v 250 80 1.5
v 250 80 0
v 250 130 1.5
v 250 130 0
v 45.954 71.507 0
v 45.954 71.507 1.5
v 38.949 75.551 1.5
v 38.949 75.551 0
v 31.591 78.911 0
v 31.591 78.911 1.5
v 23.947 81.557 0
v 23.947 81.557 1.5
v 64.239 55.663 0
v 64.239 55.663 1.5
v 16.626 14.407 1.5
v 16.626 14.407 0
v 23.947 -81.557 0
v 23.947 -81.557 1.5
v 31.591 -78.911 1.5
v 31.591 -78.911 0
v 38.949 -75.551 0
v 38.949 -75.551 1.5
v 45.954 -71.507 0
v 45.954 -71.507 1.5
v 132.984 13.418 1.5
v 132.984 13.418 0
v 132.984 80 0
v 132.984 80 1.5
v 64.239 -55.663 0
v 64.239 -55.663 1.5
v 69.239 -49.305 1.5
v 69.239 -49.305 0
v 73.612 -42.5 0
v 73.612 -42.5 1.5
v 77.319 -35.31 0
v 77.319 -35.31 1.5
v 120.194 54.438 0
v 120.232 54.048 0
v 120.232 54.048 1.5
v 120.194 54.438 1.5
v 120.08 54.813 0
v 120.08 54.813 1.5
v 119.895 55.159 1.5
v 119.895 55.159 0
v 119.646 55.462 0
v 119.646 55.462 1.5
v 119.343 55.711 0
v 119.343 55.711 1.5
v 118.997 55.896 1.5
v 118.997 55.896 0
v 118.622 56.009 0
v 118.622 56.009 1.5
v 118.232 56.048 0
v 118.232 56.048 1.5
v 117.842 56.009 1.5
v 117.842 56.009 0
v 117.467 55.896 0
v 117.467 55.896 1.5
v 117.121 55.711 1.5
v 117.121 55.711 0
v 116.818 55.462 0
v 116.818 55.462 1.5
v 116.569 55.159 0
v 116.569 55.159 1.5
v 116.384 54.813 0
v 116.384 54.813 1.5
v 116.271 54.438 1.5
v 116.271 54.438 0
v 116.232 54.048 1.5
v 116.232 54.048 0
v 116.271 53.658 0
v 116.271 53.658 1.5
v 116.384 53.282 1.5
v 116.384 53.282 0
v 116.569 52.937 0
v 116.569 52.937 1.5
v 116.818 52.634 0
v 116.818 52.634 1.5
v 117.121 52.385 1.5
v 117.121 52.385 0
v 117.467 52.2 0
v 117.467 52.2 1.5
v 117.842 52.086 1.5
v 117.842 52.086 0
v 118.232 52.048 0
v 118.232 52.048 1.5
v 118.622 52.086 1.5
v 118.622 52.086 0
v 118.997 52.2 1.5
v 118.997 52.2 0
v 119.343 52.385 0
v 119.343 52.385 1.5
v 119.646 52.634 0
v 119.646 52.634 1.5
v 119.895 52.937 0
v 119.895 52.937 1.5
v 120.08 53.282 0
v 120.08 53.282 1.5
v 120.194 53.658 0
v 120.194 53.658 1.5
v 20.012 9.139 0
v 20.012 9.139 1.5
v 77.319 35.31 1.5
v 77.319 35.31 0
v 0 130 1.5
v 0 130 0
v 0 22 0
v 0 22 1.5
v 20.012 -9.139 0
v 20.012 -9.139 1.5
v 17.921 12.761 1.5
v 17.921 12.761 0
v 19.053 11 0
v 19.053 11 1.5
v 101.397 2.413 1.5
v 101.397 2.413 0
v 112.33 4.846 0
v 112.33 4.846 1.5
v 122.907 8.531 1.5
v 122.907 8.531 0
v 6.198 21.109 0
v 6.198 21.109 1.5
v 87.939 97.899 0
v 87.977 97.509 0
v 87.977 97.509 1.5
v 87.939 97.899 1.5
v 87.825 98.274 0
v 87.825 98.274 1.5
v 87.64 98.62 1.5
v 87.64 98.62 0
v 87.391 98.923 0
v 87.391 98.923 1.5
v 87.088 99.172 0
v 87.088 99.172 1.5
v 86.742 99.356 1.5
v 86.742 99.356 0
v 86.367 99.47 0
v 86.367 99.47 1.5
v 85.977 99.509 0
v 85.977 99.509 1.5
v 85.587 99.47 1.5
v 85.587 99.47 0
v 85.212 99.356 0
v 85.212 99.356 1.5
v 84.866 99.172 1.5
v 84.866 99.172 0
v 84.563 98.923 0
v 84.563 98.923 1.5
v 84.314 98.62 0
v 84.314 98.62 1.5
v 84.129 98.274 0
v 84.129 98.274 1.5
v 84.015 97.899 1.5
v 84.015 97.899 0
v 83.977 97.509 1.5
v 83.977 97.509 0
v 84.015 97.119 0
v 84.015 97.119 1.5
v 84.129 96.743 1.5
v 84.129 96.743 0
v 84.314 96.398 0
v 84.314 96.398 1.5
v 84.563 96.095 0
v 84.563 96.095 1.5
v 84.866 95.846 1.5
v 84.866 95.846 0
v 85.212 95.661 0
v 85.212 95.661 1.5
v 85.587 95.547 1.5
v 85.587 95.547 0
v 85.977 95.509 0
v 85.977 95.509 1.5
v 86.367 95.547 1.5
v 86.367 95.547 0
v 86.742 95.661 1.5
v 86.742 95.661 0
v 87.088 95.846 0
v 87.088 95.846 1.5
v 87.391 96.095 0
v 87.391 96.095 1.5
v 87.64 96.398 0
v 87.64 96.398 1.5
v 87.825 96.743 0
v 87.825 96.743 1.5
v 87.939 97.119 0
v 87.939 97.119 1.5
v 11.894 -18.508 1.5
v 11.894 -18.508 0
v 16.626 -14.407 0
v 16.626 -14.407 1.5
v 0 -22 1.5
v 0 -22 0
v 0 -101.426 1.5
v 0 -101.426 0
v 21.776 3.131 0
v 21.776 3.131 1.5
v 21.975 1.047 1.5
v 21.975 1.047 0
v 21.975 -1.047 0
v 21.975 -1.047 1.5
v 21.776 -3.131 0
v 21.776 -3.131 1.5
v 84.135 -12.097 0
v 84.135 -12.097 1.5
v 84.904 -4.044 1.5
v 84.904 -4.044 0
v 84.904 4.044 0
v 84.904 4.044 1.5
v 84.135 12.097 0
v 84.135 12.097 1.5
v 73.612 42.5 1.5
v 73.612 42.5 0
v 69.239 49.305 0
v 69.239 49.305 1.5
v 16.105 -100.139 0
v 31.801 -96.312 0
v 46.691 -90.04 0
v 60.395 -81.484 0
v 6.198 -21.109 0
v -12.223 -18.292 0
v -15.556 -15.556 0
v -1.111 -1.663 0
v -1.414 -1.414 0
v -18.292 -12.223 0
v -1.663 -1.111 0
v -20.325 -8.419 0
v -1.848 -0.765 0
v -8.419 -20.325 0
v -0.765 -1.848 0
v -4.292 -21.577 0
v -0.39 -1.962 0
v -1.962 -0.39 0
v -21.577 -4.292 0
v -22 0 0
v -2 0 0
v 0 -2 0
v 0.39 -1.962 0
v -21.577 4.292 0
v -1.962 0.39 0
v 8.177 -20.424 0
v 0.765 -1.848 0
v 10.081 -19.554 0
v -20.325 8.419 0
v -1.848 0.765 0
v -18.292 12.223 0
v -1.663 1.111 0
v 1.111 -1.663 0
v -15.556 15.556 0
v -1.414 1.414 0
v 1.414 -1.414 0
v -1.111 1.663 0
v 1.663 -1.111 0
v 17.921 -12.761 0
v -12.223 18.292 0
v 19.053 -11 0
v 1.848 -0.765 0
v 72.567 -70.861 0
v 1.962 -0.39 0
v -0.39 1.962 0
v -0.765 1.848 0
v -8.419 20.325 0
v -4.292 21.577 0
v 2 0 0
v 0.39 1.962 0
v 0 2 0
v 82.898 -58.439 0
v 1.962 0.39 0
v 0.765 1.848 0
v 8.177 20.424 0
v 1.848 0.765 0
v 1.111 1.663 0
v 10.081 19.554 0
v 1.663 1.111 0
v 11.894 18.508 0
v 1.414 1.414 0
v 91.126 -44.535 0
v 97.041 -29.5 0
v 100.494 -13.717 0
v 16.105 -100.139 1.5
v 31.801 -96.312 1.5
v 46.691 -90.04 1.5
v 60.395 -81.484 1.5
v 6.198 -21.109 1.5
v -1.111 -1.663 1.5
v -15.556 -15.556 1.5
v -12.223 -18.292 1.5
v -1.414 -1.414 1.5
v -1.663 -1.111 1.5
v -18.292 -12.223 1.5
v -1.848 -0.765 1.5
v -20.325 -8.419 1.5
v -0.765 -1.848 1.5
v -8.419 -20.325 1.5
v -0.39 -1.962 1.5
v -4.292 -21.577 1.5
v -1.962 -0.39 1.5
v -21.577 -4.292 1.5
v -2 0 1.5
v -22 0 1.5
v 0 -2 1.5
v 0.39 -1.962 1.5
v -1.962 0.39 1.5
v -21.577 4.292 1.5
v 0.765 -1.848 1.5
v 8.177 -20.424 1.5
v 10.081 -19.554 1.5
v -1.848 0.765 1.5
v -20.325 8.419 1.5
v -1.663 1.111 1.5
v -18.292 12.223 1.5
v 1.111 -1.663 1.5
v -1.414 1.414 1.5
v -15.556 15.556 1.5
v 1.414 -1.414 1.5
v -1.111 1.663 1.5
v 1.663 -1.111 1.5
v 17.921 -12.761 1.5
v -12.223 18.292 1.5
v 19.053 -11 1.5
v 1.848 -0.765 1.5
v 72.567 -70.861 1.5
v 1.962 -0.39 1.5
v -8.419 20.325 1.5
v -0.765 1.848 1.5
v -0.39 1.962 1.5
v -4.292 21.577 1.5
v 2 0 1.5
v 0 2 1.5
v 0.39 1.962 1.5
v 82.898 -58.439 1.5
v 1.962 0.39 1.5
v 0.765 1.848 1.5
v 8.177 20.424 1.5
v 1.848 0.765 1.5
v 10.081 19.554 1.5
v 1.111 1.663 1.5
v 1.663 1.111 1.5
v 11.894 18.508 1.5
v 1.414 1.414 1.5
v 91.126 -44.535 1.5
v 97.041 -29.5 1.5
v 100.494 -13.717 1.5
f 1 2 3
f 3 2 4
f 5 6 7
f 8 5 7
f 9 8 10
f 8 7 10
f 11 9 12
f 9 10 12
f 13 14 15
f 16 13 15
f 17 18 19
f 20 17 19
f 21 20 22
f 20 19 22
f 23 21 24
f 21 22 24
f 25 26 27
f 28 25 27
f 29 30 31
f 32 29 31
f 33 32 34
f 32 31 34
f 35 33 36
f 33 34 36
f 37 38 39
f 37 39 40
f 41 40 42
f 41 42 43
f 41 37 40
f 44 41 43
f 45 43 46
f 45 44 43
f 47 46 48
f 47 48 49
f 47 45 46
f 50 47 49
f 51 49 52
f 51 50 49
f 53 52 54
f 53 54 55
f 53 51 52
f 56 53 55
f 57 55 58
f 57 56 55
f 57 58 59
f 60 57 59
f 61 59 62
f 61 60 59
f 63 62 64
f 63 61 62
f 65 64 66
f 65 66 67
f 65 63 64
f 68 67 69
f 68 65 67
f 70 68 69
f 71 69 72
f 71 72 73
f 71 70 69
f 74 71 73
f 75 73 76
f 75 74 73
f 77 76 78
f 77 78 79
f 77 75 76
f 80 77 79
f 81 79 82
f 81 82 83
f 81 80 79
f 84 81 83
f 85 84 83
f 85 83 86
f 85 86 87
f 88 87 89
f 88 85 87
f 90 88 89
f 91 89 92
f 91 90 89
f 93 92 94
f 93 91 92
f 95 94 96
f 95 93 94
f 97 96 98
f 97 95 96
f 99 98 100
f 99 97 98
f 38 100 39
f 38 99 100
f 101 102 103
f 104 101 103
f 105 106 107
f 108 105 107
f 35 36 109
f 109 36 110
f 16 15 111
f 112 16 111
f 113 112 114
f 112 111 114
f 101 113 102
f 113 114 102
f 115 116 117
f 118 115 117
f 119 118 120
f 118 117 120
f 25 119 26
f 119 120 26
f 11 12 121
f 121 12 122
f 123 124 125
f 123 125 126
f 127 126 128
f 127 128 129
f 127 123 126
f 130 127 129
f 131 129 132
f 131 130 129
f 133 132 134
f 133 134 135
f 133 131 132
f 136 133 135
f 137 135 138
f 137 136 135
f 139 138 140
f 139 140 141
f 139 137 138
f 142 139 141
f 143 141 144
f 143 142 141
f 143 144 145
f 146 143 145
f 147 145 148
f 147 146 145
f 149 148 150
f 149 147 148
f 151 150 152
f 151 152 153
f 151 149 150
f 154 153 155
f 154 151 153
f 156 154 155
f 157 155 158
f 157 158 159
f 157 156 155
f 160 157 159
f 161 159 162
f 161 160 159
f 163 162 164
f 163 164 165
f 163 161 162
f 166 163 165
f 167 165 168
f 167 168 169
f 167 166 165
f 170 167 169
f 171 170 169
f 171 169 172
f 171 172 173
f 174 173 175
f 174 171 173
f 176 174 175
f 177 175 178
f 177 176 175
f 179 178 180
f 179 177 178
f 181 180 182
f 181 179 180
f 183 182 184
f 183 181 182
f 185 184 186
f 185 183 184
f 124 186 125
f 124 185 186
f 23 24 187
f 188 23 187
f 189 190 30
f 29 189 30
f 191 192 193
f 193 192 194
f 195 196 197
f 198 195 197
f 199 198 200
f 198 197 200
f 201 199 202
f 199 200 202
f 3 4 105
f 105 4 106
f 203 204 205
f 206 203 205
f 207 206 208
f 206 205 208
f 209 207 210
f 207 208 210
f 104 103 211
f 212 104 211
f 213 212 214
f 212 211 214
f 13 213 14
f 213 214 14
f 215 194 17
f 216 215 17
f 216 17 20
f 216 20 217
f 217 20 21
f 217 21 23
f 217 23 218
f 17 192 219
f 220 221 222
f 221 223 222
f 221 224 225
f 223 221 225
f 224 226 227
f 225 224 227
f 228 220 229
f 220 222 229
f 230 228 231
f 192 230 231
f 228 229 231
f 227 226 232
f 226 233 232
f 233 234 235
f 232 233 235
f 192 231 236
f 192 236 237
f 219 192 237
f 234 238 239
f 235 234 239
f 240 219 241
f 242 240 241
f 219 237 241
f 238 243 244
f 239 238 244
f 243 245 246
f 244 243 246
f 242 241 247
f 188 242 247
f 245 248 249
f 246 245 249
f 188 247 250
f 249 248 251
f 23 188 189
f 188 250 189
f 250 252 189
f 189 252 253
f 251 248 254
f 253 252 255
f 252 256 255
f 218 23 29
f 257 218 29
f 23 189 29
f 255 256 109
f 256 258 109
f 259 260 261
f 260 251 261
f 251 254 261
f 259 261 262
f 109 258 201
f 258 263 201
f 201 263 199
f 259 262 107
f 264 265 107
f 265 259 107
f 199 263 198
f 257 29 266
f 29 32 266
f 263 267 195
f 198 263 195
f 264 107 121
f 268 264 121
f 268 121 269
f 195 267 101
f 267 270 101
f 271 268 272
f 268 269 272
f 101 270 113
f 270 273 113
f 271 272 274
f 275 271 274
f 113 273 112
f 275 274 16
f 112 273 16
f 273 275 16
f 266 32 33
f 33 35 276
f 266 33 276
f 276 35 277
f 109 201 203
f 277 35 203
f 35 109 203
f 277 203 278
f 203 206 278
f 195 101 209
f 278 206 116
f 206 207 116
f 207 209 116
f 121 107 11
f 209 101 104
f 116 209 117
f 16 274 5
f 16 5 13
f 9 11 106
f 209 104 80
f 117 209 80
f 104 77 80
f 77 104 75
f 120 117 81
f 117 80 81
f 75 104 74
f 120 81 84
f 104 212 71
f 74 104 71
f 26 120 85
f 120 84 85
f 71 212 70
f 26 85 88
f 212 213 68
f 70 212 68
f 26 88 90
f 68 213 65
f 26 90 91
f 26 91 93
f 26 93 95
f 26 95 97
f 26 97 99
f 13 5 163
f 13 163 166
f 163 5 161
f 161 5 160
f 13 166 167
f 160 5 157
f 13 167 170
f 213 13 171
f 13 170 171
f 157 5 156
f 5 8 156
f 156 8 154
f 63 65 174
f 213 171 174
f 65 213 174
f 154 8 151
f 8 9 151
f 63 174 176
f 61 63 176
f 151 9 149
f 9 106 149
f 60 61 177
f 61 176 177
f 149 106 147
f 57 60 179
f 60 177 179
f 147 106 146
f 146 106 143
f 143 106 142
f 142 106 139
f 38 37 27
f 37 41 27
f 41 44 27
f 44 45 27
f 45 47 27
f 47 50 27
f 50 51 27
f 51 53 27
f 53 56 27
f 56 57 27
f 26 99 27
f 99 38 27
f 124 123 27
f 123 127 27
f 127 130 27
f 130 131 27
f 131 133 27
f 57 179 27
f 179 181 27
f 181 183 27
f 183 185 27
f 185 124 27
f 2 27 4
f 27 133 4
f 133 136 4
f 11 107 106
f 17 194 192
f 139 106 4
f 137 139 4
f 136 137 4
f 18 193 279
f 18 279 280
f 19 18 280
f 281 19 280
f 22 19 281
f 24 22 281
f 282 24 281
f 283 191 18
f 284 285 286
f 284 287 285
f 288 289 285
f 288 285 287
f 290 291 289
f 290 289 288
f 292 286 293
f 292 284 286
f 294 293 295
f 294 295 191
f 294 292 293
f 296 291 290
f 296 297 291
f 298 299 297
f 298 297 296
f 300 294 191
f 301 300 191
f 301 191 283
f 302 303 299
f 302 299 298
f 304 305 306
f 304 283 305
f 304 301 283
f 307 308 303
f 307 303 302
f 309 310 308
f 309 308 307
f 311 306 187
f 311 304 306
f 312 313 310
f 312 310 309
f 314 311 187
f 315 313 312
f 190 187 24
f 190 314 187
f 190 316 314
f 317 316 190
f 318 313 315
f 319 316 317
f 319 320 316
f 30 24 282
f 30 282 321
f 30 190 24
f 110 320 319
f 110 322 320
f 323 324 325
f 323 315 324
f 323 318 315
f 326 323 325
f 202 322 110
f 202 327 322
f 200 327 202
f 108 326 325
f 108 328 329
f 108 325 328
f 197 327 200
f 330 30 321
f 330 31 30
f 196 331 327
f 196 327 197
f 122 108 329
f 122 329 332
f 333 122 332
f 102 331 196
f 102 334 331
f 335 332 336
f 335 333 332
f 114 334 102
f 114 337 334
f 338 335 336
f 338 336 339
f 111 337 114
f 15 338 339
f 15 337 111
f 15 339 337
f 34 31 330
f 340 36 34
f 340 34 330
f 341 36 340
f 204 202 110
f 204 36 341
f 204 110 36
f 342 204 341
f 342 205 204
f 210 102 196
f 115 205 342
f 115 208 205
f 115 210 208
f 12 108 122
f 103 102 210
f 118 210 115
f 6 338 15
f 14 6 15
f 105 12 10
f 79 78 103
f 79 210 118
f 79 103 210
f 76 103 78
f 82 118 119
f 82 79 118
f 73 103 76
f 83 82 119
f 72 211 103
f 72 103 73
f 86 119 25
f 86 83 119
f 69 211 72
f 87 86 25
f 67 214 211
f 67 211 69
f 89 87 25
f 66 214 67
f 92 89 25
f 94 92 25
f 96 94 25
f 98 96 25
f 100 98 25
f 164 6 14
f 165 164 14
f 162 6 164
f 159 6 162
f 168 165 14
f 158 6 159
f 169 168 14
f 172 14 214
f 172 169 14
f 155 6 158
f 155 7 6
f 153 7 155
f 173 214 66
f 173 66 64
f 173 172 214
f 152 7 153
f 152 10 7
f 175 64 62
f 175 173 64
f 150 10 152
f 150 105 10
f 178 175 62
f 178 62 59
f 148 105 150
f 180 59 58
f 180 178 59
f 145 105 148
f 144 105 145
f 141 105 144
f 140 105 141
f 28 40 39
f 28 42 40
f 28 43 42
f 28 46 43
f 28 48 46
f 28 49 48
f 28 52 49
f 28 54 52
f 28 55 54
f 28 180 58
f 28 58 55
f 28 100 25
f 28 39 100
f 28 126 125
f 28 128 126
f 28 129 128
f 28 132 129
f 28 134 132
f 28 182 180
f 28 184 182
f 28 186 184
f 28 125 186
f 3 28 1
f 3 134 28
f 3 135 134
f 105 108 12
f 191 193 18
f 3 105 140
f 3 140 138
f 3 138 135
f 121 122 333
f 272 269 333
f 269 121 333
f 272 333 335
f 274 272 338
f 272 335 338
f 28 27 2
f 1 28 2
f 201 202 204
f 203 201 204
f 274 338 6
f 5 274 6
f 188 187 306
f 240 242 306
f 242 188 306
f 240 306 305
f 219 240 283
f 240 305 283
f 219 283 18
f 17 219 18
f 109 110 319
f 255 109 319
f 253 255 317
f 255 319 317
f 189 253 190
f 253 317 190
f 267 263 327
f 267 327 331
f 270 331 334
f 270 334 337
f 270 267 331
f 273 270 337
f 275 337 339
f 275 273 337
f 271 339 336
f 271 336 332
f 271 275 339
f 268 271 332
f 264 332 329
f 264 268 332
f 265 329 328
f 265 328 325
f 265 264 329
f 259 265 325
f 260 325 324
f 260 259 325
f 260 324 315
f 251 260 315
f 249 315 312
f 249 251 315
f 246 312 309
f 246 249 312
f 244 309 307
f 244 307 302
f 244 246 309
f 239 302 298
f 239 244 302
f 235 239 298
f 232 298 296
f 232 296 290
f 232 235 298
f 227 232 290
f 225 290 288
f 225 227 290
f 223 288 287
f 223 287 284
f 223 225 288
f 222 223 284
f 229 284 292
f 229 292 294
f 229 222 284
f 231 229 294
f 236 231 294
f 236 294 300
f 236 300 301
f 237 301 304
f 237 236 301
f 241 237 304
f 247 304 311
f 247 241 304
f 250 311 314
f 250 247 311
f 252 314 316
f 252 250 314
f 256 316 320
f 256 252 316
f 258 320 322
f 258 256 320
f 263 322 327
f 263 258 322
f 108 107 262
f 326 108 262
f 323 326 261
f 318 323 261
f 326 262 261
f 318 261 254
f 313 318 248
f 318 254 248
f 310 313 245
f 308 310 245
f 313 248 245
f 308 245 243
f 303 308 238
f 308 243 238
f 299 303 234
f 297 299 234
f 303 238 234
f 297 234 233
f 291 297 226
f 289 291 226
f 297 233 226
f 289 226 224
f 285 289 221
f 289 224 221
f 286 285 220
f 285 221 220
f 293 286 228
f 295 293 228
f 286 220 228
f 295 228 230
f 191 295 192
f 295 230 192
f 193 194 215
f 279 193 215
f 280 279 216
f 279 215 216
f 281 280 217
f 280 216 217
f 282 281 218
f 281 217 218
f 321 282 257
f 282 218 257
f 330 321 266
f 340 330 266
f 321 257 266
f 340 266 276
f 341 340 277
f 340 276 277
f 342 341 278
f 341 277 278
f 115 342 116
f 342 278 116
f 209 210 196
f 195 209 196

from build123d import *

# Parameters (mm, degrees)
SKETCH1_R           = 2
BOSS_EXTRUDE1_DEPTH = 1.5
CUT_EXTRUDE1_DEPTH  = 2.5


with BuildPart() as part:
    # Sketch1 → Boss-Extrude1 (new body)
    with BuildSketch(Plane.XY):
        with BuildLine():
            Line((0, 130), (0, 22))
            ThreePointArc((0, 22), (-22, 0), (0, -22))
            Line((0, -22), (0, -101.426173946))
            ThreePointArc((0, -101.426173946), (72.567414345, -70.860702344), (101.397454872, 2.413484395))
            ThreePointArc((101.397454872, 2.413484395), (117.671962719, 6.534414164), (132.983960448, 13.418046445))
            Line((132.983960448, 13.418046445), (132.983960448, 80))
            Line((132.983960448, 80), (250, 80))
            Line((250, 80), (250, 130))
            Line((250, 130), (0, 130))
        make_face()
        Circle(SKETCH1_R, mode=Mode.SUBTRACT)
        with Locations((85.977020164, 97.508727834)):
            Circle(SKETCH1_R, mode=Mode.SUBTRACT)
        with Locations((118.232097827, 54.047858824)):
            Circle(SKETCH1_R, mode=Mode.SUBTRACT)
    extrude(amount=BOSS_EXTRUDE1_DEPTH)

    # Sketch2 → Cut-Extrude1 (cut, through all)
    with BuildSketch(Plane.XY.offset(1.5)):
        with BuildLine():
            Line((6.198116251, -21.10884542), (23.947267332, -81.556902757))
            ThreePointArc((23.947267332, -81.556902757), (35.310276105, -77.318719605), (45.954469484, -71.506550291))
            Line((45.954469484, -71.506550291), (11.894097984, -18.507577722))
            ThreePointArc((11.894097984, -18.507577722), (9.139130286, -20.011903898), (6.198116251, -21.10884542))
        make_face()
        with BuildLine():
            Line((16.626490636, -14.406936147), (64.23871382, -55.663162385))
            ThreePointArc((64.23871382, -55.663162385), (71.506550291, -45.954469484), (77.318719605, -35.310276105))
            Line((77.318719605, -35.310276105), (20.011903898, -9.139130286))
            ThreePointArc((20.011903898, -9.139130286), (18.507577722, -11.894097984), (16.626490636, -14.406936147))
        make_face()
        with BuildLine():
            Line((21.776071721, -3.130926442), (84.13482256, -12.096761253))
            ThreePointArc((84.13482256, -12.096761253), (85, 0), (84.13482256, 12.096761253))
            Line((84.13482256, 12.096761253), (21.776071721, 3.130926442))
            ThreePointArc((21.776071721, 3.130926442), (22, 0), (21.776071721, -3.130926442))
        make_face()
        with BuildLine():
            Line((20.011903898, 9.139130286), (77.318719605, 35.310276105))
            ThreePointArc((77.318719605, 35.310276105), (71.506550291, 45.954469484), (64.23871382, 55.663162385))
            Line((64.23871382, 55.663162385), (16.626490636, 14.406936147))
            ThreePointArc((16.626490636, 14.406936147), (18.507577722, 11.894097984), (20.011903898, 9.139130286))
        make_face()
        with BuildLine():
            Line((11.894097984, 18.507577722), (45.954469484, 71.506550291))
            ThreePointArc((45.954469484, 71.506550291), (35.310276105, 77.318719605), (23.947267332, 81.556902757))
            Line((23.947267332, 81.556902757), (6.198116251, 21.10884542))
            ThreePointArc((6.198116251, 21.10884542), (9.139130286, 20.011903898), (11.894097984, 18.507577722))
        make_face()
    extrude(amount=-CUT_EXTRUDE1_DEPTH, mode=Mode.SUBTRACT)


solid = part.part
